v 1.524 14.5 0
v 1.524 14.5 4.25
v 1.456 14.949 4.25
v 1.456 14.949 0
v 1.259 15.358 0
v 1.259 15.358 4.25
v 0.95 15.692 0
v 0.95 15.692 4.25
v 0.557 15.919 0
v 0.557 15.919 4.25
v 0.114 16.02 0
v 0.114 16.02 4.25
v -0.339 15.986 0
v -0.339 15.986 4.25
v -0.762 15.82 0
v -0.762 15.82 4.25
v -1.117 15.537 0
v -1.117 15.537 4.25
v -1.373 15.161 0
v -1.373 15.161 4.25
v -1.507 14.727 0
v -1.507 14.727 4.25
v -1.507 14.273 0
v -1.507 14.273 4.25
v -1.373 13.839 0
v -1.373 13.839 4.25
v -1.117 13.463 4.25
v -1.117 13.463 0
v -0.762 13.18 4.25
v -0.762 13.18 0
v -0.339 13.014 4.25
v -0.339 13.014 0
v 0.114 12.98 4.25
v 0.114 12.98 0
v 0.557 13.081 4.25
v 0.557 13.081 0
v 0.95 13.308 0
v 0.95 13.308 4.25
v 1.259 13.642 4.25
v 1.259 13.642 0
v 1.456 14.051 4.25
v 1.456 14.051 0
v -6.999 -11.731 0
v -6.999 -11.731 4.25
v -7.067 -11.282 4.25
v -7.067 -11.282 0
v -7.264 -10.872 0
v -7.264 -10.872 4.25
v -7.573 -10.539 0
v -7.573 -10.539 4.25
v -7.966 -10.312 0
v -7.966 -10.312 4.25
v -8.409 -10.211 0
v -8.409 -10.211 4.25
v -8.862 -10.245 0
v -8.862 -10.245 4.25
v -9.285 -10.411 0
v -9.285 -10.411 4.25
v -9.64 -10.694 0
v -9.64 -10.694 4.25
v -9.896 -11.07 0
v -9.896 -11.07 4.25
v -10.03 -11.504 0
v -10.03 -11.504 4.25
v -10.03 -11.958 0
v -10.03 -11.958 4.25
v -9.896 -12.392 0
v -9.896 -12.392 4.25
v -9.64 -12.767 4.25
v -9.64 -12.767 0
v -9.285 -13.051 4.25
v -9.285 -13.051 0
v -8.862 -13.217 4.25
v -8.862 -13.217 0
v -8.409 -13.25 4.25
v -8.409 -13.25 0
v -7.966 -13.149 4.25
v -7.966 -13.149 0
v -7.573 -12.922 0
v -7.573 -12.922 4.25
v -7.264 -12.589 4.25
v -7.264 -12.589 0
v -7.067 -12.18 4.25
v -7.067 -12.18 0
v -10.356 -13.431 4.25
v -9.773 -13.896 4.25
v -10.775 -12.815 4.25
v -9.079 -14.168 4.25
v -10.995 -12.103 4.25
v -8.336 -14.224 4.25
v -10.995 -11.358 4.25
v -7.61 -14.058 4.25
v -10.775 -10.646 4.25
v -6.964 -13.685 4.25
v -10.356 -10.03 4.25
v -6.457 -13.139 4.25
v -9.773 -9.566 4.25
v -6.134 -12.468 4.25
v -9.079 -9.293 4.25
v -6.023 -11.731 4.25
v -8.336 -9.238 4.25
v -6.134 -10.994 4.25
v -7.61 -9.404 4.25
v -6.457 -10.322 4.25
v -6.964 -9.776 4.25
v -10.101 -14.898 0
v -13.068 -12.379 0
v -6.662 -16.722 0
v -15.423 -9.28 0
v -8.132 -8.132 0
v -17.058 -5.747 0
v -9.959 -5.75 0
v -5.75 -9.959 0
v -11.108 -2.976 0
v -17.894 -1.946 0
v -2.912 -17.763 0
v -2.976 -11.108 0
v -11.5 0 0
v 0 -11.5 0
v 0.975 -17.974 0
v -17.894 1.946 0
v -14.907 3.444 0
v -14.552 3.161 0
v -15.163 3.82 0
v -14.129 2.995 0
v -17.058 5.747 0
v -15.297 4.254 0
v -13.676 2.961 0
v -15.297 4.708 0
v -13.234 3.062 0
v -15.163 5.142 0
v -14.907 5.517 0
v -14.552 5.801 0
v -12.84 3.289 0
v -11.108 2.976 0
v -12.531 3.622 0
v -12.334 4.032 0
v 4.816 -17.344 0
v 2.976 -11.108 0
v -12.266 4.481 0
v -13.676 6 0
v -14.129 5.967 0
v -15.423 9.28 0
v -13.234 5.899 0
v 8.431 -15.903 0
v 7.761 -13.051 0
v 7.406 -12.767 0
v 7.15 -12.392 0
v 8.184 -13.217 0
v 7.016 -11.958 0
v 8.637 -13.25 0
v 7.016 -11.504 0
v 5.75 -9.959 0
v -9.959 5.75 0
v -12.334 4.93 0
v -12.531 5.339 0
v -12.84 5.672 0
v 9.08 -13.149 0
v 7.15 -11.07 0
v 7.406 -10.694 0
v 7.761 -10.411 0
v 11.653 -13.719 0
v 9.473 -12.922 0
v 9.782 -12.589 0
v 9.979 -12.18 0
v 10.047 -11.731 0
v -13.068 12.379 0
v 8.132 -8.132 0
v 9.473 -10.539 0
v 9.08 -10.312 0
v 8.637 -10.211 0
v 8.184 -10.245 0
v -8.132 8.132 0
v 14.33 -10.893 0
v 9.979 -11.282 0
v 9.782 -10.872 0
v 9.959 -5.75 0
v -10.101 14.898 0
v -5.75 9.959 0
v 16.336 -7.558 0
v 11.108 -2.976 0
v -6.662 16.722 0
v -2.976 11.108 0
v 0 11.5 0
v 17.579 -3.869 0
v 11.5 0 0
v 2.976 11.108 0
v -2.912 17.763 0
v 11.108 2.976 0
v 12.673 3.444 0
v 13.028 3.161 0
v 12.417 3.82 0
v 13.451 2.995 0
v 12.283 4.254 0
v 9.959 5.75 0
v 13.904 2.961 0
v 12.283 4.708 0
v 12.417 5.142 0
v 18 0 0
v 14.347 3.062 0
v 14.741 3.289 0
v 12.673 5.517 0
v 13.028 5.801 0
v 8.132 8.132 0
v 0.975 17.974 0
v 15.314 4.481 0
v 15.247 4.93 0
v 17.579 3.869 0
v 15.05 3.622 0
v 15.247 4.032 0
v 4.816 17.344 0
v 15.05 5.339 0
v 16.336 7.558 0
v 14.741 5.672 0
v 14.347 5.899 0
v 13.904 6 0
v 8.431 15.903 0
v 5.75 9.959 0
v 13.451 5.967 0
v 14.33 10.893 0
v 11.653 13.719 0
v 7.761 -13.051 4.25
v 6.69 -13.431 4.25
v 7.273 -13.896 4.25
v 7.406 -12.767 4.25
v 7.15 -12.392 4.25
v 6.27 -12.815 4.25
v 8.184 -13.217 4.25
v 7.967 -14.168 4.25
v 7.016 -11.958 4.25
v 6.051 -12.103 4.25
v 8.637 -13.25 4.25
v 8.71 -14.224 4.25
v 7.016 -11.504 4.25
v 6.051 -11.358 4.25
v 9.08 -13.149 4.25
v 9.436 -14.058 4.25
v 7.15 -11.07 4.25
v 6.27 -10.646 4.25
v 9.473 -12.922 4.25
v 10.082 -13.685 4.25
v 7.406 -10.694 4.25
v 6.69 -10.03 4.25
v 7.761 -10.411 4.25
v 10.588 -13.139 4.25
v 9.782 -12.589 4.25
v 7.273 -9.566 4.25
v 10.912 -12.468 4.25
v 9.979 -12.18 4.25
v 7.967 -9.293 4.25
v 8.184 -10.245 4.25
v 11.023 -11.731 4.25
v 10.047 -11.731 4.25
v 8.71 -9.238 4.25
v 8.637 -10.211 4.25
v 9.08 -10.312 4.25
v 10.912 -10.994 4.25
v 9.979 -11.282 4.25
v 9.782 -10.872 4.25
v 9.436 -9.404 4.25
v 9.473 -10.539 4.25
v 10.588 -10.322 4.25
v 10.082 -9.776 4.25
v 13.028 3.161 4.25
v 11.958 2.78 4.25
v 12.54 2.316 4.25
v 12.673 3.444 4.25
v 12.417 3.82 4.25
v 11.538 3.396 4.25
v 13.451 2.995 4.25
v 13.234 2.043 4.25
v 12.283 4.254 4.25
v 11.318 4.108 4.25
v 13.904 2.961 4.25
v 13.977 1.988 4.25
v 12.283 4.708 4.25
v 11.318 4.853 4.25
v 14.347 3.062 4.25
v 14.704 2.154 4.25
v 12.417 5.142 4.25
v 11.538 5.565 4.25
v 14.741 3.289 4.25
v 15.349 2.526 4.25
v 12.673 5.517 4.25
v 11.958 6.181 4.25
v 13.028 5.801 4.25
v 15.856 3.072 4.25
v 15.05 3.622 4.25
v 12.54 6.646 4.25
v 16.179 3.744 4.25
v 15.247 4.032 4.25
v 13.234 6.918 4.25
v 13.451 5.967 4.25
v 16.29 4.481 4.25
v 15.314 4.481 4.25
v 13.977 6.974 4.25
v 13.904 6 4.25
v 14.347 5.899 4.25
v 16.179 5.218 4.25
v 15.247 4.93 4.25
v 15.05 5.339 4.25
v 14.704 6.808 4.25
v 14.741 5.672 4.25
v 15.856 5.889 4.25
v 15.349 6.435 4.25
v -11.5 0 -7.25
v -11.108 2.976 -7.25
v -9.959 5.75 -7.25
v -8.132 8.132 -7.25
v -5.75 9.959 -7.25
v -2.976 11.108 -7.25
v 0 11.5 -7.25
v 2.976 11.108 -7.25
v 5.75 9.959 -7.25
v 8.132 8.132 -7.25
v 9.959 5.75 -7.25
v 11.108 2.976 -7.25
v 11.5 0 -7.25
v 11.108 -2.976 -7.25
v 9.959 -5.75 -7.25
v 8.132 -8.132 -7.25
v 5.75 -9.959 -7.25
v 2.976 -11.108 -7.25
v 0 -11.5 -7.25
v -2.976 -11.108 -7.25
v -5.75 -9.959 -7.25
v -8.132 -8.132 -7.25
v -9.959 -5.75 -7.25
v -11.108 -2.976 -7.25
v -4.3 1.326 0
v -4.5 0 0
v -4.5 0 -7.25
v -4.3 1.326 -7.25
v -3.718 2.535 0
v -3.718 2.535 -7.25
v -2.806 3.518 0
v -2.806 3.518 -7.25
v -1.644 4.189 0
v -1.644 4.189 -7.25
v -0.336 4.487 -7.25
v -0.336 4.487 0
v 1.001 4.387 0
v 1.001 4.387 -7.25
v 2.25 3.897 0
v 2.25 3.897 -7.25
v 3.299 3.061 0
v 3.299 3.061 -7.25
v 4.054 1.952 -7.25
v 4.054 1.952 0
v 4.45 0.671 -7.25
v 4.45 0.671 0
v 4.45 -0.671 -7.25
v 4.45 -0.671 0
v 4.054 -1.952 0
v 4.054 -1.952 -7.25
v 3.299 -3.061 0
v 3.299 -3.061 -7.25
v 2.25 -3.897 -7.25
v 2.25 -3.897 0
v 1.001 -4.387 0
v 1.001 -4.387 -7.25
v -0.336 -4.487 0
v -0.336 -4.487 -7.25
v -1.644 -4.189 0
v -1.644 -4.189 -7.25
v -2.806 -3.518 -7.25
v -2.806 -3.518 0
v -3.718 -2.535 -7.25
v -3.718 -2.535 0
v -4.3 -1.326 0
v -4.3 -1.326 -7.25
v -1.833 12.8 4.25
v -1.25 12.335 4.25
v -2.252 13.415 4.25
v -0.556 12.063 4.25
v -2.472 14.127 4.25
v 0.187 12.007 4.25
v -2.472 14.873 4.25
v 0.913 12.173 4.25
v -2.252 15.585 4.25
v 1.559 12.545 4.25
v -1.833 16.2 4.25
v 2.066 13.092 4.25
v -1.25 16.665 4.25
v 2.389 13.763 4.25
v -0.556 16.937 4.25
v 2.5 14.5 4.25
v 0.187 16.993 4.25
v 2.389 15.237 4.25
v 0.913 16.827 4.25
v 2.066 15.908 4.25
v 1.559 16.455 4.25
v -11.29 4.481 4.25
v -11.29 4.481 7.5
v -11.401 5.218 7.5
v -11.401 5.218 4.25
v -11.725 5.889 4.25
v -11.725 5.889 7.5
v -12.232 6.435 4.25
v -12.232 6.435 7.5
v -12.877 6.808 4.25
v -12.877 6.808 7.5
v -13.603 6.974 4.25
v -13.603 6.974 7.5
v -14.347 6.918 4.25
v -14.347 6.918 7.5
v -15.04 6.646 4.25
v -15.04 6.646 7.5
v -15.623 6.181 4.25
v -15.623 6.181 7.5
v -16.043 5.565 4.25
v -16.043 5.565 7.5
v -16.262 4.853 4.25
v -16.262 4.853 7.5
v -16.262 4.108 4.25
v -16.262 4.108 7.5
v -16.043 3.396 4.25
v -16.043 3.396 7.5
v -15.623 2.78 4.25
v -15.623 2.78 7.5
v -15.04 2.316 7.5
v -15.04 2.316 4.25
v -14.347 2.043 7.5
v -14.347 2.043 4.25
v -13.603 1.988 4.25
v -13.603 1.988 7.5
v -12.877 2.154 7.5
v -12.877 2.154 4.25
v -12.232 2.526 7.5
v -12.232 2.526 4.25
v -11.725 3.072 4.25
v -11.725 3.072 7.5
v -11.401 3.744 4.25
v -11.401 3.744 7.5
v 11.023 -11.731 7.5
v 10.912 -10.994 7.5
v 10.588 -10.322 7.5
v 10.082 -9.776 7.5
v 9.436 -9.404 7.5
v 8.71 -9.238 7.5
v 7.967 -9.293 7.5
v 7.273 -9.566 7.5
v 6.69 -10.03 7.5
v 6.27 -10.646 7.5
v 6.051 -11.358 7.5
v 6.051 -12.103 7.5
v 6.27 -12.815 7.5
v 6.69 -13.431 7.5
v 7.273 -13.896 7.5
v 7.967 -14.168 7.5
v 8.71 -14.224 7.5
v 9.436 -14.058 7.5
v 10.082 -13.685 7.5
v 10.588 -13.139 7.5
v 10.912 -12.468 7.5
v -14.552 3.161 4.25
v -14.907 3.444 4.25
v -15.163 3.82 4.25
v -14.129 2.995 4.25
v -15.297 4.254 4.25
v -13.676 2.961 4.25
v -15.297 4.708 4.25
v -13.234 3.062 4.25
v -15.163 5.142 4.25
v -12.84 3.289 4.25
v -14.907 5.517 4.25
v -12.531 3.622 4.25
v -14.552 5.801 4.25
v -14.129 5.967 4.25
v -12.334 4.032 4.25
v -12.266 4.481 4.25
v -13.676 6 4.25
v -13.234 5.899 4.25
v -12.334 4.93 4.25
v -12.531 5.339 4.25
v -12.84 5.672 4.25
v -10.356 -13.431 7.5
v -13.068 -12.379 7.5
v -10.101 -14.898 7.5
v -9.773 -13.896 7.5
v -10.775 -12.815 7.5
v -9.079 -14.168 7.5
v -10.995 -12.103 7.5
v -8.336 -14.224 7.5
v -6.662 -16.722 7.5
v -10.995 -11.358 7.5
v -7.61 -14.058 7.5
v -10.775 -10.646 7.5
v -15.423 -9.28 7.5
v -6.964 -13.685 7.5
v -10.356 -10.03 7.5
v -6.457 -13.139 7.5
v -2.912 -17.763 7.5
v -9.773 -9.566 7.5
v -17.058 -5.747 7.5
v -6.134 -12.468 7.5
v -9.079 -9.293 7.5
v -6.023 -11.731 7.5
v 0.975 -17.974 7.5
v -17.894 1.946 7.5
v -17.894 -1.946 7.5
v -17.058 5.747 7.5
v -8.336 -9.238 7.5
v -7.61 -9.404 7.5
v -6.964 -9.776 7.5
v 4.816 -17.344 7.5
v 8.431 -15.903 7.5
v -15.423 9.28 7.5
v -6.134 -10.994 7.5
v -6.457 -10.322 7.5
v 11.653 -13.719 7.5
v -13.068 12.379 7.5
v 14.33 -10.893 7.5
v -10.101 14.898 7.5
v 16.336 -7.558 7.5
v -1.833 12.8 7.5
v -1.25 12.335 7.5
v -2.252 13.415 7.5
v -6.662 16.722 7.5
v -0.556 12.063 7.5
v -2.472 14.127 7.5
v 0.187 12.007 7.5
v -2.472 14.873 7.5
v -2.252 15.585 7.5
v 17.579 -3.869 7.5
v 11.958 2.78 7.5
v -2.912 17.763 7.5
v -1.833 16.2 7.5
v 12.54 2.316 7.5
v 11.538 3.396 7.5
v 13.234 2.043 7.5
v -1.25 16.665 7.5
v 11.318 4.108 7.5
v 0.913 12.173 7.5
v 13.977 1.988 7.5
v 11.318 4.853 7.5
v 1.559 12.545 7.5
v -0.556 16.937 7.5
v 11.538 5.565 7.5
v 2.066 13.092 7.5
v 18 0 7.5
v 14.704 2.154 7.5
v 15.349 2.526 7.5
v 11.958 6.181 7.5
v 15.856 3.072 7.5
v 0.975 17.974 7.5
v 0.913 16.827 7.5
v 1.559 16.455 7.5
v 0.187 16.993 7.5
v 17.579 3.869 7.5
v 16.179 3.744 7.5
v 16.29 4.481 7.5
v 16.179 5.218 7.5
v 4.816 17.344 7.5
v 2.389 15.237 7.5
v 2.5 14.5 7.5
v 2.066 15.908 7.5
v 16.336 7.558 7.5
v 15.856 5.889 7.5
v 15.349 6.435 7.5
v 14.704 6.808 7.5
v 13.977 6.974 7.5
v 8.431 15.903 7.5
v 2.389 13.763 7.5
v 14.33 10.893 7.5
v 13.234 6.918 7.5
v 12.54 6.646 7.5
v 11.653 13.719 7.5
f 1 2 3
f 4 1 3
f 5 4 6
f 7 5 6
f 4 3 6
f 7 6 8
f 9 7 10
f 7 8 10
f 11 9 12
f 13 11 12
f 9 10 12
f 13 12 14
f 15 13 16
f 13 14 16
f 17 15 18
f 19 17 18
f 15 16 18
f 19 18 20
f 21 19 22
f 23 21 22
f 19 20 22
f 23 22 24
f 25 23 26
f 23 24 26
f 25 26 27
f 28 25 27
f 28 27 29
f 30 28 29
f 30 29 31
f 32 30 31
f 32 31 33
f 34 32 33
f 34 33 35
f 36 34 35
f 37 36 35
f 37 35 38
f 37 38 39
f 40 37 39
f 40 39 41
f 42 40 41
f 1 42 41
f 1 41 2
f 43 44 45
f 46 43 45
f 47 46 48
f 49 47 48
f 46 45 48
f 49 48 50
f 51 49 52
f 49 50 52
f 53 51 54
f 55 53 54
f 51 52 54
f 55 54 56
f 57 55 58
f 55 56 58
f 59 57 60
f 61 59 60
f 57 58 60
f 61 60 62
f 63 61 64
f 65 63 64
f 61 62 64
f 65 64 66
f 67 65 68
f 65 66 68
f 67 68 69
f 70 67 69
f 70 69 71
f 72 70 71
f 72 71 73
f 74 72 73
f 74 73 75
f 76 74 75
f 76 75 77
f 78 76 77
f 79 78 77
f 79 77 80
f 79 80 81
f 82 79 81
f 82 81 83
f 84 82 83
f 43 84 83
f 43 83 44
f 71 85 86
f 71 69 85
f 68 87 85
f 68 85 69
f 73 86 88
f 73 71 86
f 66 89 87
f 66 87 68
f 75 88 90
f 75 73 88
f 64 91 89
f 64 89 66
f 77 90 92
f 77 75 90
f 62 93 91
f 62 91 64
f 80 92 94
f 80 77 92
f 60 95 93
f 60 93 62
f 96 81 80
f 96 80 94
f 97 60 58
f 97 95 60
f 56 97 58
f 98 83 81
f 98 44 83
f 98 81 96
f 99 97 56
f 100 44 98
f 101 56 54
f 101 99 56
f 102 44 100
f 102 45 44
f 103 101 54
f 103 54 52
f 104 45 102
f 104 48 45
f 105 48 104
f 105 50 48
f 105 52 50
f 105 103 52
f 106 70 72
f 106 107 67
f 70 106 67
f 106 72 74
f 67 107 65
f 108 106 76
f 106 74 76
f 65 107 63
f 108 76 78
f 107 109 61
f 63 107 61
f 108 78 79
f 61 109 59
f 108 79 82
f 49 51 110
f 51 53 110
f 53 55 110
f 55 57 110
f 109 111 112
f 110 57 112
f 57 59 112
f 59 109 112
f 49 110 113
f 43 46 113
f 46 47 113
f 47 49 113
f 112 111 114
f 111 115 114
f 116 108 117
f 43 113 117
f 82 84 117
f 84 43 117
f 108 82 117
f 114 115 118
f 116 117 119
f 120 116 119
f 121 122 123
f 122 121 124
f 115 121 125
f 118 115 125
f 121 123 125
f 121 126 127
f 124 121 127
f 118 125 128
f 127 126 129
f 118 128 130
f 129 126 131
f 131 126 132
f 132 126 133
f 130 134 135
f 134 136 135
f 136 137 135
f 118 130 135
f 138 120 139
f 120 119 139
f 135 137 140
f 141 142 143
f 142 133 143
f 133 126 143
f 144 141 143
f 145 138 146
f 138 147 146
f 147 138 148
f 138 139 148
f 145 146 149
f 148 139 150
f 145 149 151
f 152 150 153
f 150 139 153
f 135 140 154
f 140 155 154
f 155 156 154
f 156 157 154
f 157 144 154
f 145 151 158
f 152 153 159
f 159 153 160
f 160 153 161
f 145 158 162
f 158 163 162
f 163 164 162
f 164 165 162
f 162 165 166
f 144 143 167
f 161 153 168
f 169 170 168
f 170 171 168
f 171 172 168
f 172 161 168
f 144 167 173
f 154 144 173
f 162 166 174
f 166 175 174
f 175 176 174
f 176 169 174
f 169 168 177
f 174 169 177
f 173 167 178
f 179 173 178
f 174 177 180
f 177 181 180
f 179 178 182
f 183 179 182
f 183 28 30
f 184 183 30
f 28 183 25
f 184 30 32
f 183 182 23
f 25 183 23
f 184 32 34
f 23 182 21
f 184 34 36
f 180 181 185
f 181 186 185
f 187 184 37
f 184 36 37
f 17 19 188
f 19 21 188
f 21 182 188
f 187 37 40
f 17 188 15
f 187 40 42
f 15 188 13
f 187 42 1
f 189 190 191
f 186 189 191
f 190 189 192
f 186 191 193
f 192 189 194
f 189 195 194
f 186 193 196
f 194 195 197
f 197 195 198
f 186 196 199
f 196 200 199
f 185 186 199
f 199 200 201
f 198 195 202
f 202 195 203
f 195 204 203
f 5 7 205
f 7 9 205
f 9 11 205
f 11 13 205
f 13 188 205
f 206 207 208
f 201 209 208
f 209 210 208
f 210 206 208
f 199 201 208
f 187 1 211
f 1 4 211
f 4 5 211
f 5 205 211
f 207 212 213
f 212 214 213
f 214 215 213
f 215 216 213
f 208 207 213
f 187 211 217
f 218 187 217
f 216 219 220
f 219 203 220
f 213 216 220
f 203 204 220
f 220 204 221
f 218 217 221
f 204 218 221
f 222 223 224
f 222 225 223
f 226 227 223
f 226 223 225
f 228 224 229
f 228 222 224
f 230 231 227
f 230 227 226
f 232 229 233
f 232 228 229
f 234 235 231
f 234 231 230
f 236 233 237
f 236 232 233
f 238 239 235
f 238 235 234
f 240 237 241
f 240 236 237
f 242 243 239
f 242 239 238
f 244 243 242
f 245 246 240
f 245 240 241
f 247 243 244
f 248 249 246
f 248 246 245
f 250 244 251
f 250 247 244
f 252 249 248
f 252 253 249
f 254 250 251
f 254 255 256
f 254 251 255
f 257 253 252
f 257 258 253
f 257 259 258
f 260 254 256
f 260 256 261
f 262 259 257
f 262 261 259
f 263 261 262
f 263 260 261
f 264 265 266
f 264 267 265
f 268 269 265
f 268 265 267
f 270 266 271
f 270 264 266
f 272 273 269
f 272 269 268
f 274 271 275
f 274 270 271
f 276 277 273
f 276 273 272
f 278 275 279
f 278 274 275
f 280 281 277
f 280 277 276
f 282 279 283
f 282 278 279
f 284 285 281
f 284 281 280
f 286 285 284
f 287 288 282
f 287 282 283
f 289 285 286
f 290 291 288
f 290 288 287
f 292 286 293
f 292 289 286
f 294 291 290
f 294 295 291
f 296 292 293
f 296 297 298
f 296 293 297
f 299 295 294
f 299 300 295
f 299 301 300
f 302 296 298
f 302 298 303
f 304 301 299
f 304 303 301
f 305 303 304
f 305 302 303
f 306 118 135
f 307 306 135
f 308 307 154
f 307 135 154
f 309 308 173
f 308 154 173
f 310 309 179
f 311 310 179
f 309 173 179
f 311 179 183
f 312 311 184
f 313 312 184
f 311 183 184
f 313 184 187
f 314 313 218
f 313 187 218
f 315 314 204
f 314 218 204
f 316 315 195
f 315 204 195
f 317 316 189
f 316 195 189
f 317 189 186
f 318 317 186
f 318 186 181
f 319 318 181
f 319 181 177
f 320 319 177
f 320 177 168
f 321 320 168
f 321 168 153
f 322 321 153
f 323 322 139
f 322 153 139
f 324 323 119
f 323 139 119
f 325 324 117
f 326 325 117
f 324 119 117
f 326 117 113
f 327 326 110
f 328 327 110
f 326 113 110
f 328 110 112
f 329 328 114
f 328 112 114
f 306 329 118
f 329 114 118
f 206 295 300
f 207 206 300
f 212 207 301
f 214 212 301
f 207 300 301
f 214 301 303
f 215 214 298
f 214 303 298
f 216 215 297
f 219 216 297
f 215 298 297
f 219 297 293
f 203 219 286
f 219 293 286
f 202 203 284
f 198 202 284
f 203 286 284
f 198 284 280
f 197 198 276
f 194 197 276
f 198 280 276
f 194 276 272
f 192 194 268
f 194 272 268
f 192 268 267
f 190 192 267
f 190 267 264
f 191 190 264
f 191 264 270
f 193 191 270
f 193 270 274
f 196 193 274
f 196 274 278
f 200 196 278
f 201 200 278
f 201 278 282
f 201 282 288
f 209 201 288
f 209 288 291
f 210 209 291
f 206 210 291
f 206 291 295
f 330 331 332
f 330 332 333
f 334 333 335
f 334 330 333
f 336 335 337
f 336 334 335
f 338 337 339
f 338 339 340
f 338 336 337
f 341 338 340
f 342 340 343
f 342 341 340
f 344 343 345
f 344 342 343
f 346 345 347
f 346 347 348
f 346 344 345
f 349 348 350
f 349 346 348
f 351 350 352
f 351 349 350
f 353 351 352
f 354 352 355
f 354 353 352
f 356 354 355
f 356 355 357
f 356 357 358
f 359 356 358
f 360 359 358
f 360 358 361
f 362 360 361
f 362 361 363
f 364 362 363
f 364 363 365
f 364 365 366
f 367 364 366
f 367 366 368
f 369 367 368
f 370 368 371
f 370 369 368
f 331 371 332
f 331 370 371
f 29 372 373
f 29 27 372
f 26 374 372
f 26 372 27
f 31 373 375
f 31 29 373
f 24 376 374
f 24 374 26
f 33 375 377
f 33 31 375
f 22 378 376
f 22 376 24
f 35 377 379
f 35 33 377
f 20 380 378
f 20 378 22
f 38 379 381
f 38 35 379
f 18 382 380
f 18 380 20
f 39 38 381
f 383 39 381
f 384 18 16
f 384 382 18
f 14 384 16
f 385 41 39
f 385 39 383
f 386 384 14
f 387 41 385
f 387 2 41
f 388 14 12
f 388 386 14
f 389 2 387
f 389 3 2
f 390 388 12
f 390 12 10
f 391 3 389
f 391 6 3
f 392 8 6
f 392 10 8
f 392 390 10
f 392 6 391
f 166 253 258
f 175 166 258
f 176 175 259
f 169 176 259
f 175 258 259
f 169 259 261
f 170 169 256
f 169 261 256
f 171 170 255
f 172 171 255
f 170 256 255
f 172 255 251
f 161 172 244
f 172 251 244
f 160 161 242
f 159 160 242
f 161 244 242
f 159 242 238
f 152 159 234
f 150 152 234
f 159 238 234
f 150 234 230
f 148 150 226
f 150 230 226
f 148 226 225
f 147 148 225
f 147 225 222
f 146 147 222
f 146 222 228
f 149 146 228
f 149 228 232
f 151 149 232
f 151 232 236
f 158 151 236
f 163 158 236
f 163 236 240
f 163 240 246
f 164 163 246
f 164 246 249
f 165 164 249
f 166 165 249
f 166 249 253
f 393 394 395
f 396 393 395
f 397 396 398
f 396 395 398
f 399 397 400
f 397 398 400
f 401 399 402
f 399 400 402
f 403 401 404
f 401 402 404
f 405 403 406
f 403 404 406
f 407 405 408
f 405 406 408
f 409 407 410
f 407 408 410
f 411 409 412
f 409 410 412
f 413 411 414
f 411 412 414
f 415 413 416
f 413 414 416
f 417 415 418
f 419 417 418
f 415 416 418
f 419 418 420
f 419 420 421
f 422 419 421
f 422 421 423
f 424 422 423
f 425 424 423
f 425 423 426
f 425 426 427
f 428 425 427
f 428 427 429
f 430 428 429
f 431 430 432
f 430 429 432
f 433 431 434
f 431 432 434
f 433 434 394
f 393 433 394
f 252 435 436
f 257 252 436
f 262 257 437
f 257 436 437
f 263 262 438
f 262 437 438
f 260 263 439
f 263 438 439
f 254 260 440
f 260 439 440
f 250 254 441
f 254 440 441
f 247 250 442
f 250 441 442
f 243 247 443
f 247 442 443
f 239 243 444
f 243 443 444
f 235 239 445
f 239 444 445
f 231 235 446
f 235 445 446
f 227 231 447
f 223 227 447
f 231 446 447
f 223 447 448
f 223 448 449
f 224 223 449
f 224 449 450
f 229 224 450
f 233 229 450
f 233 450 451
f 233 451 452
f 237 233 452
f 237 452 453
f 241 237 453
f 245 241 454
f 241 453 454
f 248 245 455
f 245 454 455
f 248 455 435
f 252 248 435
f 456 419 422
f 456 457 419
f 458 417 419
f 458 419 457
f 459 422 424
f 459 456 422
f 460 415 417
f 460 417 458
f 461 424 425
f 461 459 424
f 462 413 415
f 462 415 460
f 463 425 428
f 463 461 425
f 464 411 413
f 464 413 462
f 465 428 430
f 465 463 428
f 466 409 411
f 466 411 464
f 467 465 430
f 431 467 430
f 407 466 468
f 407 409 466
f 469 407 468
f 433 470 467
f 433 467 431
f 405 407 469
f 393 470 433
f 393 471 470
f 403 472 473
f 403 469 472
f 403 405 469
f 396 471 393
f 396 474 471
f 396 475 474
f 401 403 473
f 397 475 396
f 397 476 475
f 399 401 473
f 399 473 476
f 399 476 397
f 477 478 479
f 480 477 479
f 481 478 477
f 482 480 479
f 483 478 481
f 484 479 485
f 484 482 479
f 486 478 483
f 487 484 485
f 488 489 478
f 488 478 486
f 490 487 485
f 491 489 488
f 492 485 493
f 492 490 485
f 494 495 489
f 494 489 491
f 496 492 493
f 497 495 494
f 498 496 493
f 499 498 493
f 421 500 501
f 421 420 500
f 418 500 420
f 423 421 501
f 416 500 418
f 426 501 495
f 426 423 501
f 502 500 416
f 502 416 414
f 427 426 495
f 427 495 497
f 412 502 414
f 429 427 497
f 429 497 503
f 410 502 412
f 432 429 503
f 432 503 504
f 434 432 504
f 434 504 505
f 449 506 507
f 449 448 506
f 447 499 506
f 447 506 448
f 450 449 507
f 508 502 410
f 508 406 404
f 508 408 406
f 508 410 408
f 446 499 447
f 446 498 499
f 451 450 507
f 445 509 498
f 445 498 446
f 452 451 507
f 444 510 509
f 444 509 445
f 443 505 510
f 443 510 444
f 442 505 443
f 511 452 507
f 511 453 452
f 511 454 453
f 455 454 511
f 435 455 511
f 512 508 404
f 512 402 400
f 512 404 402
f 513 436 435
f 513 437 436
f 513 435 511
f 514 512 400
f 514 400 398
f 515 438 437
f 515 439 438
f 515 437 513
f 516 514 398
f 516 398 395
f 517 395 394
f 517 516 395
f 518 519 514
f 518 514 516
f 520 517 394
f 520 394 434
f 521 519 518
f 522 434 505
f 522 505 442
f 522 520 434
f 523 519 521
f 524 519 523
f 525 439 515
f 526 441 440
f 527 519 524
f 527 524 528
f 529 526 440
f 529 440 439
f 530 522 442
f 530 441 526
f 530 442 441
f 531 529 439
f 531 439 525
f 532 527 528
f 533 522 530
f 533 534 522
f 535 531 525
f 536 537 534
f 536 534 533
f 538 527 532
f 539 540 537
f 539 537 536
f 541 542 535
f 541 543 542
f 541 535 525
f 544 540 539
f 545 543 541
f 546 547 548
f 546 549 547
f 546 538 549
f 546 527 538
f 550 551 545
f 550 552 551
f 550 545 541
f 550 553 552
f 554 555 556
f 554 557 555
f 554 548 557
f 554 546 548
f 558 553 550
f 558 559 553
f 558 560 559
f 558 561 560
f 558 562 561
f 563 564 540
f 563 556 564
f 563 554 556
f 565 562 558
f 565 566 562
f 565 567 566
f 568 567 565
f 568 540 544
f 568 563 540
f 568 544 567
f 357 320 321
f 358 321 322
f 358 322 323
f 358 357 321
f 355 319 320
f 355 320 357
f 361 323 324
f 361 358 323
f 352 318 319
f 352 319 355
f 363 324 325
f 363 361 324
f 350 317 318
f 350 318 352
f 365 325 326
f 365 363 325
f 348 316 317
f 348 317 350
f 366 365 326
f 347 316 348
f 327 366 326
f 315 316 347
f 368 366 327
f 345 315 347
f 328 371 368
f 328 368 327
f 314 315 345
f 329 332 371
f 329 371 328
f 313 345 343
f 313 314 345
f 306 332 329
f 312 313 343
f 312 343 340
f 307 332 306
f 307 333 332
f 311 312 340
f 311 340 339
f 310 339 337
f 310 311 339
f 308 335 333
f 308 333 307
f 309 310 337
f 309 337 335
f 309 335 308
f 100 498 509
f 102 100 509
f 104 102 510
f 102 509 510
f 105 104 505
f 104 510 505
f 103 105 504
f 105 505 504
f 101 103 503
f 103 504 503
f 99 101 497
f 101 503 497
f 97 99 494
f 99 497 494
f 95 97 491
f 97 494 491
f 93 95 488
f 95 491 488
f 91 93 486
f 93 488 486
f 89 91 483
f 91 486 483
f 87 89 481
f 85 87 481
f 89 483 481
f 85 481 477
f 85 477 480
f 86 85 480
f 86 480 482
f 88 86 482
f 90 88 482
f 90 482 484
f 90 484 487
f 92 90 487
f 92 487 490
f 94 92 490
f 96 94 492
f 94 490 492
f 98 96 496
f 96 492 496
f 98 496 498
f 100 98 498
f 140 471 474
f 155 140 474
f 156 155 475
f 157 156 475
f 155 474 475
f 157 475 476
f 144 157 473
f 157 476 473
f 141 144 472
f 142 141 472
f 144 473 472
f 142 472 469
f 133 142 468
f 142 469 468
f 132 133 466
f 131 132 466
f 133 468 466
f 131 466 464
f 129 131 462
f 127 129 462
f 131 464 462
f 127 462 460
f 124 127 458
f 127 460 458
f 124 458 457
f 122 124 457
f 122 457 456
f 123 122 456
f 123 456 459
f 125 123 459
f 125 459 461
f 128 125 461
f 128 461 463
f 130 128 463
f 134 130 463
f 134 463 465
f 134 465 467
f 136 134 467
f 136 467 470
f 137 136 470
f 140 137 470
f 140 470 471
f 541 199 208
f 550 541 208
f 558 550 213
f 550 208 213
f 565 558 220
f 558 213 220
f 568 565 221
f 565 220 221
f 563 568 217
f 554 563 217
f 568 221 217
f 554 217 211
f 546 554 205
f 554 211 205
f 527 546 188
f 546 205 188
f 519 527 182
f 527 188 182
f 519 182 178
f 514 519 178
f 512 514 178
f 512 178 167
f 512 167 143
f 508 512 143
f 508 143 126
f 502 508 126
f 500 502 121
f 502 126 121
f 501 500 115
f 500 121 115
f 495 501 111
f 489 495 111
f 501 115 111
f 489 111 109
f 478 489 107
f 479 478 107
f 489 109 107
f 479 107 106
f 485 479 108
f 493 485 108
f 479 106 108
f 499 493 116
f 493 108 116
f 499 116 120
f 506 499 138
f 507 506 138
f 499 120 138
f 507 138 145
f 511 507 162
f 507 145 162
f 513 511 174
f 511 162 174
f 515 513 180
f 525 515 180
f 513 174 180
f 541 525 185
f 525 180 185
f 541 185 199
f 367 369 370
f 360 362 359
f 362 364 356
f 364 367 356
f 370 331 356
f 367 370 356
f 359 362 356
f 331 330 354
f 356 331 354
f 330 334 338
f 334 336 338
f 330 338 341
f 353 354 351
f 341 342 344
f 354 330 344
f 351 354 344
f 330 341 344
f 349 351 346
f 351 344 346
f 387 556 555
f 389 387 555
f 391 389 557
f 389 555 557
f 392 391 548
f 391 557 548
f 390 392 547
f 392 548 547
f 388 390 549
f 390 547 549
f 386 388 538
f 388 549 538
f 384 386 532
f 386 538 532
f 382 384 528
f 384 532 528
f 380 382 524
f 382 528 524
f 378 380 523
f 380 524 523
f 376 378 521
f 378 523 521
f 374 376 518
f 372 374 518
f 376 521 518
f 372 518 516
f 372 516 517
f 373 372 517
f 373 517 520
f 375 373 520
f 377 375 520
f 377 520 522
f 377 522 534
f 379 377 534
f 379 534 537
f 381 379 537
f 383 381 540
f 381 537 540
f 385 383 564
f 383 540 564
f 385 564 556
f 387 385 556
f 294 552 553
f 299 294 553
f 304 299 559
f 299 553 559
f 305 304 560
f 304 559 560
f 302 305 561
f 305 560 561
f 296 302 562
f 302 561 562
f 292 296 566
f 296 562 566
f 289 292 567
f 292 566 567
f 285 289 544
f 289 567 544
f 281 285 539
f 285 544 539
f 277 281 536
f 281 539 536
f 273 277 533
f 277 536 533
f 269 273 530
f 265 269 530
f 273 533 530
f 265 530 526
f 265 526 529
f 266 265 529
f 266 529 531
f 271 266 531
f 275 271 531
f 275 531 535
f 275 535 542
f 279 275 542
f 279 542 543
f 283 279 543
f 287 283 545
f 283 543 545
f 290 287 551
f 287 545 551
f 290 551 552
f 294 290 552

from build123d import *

# Parameters (mm, degrees)
SKETCH1_R           = 18
BOSS_EXTRUDE1_DEPTH = 7.5
SKETCH2_R           = 11.5
SKETCH2_R_2         = 4.5
BOSS_EXTRUDE2_DEPTH = 7.25
SKETCH3_R           = 1.524
CUT_EXTRUDE1_DEPTH  = 16.75
SKETCH4_R           = 2.5
CUT_EXTRUDE2_DEPTH  = 3.25


with BuildPart() as part:
    # Sketch1 → Boss-Extrude1 (new body)
    with BuildSketch(Plane.XY):
        Circle(SKETCH1_R)
    extrude(amount=BOSS_EXTRUDE1_DEPTH)

    # Sketch2 → Boss-Extrude2 (add)
    with BuildSketch(Plane(origin=(0, 0, 0), x_dir=(-1, 0, 0), z_dir=(0, 0, -1))):
        Circle(SKETCH2_R)
        Circle(SKETCH2_R_2, mode=Mode.SUBTRACT)
    extrude(amount=BOSS_EXTRUDE2_DEPTH)

    # Sketch3 → Cut-Extrude1 (cut)
    with BuildSketch(Plane.XY.offset(7.5)):
        with Locations((0, 14.5)):
            Circle(SKETCH3_R)
        with Locations((13.790319486, 4.480746418)):
            Circle(SKETCH3_R)
        with Locations((8.522886158, -11.730746418)):
            Circle(SKETCH3_R)
        with Locations((-8.522886158, -11.730746418)):
            Circle(SKETCH3_R)
        with Locations((-13.790319486, 4.480746418)):
            Circle(SKETCH3_R)
    extrude(amount=-CUT_EXTRUDE1_DEPTH, mode=Mode.SUBTRACT)

    # Sketch4 → Cut-Extrude2 (cut)
    with BuildSketch(Plane.XY.offset(7.5)):
        with Locations((0, 14.5)):
            Circle(SKETCH4_R)
        with Locations((13.790319486, 4.480746418)):
            Circle(SKETCH4_R)
        with Locations((8.522886158, -11.730746418)):
            Circle(SKETCH4_R)
        with Locations((-8.522886158, -11.730746418)):
            Circle(SKETCH4_R)
        with Locations((-13.790319486, 4.480746418)):
            Circle(SKETCH4_R)
    extrude(amount=-CUT_EXTRUDE2_DEPTH, mode=Mode.SUBTRACT)


solid = part.part
